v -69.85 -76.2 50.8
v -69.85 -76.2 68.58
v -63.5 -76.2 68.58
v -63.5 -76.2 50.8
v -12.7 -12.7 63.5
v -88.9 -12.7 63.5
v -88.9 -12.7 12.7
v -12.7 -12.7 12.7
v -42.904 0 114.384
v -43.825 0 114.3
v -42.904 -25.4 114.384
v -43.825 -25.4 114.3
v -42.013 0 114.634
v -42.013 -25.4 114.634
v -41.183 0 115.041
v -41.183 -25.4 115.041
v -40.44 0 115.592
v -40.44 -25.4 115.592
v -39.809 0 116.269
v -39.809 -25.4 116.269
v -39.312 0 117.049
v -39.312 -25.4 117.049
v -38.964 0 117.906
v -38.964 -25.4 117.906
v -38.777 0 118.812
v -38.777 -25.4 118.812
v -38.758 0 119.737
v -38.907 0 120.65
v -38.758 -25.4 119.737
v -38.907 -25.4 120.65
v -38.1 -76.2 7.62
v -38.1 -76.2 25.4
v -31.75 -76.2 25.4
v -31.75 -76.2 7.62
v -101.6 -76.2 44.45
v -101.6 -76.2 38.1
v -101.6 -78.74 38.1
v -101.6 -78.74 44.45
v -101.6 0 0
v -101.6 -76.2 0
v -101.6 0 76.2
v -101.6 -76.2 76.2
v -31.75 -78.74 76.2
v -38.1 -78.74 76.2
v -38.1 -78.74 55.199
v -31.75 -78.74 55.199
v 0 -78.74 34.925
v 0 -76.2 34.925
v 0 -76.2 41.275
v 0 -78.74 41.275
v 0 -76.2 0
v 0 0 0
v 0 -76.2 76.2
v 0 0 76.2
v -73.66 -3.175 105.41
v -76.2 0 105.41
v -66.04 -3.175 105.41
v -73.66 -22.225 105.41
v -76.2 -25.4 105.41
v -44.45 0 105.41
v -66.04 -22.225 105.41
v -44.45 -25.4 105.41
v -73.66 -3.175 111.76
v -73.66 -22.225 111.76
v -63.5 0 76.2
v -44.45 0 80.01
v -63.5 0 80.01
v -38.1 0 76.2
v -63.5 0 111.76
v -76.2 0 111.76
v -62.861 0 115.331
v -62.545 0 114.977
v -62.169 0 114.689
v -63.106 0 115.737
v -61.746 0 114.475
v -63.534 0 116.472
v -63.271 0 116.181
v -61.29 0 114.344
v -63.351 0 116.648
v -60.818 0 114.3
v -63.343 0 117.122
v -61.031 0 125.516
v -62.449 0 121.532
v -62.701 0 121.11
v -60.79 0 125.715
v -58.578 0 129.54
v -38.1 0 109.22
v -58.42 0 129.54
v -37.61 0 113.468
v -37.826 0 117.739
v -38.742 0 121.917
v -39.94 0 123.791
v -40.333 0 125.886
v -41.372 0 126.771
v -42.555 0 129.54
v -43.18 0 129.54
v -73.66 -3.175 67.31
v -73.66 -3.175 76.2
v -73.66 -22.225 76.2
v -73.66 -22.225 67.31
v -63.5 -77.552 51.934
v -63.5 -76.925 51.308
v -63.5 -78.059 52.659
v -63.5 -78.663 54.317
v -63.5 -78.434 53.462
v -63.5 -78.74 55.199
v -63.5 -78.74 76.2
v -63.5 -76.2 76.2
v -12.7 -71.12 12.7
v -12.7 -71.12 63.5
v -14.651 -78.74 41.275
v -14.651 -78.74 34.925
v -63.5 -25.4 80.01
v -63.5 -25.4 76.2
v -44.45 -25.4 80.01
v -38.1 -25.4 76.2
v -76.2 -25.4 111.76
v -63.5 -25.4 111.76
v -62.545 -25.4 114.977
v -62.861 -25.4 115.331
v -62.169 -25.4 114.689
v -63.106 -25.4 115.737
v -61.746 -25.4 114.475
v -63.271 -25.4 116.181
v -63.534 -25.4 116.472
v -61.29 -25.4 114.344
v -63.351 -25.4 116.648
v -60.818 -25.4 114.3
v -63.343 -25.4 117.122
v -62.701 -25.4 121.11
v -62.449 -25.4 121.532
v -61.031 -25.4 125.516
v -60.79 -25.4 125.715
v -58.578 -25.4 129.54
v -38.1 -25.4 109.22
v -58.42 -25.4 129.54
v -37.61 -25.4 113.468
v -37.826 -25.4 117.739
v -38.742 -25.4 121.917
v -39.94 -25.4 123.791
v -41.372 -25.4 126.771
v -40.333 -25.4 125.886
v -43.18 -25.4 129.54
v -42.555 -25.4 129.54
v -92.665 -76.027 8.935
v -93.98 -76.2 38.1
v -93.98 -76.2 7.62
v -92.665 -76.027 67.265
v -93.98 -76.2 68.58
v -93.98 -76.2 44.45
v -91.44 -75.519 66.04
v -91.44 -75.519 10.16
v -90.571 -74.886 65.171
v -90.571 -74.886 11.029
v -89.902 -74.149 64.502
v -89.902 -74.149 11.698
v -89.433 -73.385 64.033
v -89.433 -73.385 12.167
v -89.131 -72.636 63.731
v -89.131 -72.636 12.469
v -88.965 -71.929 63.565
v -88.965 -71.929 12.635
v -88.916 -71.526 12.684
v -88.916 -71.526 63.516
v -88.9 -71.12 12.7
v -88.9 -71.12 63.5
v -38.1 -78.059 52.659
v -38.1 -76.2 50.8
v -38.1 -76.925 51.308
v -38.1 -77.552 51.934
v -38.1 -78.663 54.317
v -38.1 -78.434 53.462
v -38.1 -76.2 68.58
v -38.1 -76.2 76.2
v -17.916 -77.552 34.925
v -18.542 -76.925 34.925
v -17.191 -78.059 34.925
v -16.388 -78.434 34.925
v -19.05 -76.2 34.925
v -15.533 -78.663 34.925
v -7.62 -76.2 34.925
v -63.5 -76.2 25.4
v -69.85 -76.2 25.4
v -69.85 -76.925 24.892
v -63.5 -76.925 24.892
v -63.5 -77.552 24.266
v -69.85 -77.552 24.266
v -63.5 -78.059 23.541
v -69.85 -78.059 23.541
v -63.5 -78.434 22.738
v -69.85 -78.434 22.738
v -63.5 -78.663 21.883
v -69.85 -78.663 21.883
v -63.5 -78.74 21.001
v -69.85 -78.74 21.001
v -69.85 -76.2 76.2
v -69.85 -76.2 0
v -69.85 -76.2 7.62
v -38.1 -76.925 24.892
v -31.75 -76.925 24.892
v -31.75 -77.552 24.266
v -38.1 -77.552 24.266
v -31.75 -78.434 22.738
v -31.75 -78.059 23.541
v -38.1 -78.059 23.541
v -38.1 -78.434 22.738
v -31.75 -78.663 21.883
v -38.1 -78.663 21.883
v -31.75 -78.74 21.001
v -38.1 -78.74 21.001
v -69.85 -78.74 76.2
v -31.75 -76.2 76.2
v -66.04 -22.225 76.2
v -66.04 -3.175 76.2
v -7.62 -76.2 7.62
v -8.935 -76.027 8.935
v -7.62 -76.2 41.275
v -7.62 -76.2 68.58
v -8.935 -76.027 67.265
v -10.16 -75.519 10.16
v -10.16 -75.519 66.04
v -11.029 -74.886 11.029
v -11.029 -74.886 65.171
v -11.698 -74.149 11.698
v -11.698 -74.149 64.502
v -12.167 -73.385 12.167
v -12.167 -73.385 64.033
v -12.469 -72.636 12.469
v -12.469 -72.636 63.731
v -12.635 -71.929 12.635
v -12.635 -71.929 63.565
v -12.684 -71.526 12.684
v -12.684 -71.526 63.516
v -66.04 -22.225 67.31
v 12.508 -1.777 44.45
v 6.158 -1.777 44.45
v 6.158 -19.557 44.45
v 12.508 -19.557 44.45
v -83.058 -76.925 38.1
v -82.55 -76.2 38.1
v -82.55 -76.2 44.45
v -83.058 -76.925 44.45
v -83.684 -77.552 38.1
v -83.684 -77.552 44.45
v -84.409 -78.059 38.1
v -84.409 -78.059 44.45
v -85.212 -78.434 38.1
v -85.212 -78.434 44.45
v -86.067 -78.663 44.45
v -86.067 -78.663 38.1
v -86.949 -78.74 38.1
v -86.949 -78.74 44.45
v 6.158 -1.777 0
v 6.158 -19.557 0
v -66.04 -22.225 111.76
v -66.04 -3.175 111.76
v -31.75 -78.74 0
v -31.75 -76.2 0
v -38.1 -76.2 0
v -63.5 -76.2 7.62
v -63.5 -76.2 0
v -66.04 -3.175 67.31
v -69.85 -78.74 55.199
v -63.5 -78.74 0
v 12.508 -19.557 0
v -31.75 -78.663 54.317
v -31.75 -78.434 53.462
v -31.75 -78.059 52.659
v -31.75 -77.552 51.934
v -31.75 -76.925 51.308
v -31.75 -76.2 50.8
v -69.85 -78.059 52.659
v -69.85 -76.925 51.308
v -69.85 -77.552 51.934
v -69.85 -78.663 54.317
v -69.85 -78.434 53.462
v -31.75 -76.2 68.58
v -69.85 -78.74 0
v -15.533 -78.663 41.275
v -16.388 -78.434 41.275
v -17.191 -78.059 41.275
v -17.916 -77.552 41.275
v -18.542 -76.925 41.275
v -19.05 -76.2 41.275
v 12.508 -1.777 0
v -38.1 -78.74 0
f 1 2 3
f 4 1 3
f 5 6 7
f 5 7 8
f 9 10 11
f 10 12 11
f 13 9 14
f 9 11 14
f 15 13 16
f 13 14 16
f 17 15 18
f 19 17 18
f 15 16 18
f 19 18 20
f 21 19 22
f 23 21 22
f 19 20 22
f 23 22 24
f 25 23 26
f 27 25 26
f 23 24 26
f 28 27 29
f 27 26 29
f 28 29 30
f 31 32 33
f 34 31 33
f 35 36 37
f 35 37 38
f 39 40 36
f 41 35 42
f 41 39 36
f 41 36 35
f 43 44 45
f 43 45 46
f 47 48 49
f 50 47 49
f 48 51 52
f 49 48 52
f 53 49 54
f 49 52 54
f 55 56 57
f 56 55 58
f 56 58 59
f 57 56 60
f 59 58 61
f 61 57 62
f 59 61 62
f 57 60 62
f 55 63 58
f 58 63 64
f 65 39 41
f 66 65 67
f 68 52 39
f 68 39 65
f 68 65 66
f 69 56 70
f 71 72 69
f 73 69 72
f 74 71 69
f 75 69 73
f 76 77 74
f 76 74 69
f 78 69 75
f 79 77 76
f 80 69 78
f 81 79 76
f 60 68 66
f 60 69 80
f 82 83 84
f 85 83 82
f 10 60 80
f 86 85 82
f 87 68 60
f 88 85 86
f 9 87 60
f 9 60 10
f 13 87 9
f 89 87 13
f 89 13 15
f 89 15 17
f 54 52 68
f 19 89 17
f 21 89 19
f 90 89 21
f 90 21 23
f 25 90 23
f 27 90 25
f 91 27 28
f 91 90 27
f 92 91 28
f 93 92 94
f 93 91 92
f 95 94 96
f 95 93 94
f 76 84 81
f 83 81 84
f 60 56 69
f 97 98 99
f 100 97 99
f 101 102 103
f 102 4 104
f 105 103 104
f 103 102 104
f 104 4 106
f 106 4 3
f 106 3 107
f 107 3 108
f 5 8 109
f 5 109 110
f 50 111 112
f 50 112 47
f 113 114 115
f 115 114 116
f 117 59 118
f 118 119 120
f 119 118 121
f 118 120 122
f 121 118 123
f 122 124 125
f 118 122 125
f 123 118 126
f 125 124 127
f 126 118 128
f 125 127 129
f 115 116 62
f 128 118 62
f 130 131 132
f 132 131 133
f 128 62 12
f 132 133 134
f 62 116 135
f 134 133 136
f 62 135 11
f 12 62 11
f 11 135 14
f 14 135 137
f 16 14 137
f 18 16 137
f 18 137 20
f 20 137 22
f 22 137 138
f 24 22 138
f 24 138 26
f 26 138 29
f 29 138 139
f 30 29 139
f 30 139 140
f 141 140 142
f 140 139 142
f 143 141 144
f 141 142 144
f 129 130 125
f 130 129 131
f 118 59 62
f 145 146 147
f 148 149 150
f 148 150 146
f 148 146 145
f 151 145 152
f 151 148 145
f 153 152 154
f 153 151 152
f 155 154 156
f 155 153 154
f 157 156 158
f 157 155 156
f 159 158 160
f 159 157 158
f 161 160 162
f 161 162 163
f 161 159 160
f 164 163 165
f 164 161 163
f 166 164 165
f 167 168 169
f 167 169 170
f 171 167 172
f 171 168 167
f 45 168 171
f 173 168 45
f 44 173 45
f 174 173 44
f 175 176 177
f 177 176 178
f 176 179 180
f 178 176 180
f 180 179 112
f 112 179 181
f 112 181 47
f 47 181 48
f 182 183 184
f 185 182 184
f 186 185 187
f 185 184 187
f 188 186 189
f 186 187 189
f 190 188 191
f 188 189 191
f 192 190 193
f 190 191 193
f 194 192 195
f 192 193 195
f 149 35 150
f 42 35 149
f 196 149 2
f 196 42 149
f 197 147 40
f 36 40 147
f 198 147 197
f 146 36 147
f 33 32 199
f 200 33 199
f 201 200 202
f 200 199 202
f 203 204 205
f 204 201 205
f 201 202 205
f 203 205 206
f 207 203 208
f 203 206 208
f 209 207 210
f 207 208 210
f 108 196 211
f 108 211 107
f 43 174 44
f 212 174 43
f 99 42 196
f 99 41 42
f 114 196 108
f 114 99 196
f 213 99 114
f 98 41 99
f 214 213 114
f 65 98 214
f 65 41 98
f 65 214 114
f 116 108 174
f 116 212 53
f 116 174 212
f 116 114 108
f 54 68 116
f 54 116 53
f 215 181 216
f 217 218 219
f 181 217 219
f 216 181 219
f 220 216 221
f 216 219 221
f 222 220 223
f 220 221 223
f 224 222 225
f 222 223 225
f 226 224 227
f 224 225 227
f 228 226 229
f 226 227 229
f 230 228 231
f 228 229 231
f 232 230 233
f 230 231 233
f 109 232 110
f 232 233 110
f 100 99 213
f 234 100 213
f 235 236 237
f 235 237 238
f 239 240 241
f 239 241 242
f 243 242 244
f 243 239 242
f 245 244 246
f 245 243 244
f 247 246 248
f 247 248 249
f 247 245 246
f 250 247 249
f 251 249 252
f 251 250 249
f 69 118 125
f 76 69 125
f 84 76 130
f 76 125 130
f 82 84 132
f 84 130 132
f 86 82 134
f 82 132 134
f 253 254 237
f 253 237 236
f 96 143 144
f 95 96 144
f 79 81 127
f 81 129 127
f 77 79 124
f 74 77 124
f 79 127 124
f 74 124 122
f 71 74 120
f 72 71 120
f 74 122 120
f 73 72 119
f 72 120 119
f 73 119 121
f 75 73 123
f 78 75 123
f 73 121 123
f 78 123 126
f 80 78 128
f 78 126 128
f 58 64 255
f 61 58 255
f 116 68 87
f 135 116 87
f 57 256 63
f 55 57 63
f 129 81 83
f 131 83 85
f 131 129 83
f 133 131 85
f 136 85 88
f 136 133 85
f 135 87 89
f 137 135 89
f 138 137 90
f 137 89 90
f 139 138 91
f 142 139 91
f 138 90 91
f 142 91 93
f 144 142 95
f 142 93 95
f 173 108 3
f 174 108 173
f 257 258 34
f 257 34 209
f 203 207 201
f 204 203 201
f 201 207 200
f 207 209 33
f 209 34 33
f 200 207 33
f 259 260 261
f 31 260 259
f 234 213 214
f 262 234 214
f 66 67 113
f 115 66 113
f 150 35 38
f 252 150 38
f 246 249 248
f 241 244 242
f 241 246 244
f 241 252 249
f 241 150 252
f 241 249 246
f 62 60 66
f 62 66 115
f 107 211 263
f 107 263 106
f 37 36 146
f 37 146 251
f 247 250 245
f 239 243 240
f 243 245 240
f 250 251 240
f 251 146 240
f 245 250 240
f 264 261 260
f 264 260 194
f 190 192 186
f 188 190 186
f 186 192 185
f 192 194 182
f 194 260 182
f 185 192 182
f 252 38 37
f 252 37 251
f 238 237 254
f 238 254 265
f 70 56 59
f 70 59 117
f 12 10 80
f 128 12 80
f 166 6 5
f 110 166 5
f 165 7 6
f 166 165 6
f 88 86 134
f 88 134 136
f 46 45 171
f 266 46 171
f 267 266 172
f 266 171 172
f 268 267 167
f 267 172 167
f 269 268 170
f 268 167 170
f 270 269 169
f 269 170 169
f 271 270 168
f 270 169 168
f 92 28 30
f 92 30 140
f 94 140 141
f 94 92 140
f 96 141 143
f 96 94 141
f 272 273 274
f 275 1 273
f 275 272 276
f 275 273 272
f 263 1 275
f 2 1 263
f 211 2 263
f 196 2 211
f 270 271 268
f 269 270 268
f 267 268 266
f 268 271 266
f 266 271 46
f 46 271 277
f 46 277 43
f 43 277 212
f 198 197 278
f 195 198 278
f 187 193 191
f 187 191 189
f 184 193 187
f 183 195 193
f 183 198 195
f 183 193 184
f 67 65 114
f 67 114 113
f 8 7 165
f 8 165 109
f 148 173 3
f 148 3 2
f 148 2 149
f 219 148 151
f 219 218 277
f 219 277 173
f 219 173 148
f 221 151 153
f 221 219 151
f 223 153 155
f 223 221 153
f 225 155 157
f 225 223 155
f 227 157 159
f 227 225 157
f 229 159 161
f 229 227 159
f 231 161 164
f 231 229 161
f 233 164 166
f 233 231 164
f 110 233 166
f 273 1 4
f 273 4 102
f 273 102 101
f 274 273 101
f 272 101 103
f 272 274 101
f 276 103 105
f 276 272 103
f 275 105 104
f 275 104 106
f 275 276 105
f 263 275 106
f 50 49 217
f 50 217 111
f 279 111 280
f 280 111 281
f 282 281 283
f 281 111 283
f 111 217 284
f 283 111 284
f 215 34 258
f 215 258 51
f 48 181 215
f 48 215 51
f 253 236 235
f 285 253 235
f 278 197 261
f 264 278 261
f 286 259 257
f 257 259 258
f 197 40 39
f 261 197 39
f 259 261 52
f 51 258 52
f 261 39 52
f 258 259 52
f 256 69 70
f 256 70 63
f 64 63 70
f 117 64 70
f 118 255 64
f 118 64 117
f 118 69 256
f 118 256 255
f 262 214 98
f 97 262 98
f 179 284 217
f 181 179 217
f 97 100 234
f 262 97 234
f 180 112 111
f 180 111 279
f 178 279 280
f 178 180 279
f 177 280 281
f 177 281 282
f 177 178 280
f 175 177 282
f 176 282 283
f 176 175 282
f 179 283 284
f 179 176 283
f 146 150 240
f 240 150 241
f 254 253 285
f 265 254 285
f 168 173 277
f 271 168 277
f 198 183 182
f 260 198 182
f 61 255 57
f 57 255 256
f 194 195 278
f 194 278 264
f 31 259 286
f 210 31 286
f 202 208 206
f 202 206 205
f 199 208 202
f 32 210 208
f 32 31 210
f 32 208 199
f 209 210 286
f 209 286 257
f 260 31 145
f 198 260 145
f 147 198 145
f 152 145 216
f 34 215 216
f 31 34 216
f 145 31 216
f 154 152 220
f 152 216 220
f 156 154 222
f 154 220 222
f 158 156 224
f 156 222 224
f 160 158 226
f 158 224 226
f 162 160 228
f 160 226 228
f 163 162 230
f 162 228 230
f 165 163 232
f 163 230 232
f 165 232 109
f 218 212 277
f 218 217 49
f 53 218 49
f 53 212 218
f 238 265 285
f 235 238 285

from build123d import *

# Parameters (mm, degrees)
F0_W        = 101.6
F0_H        = 76.2
F1_DEPTH    = 76.2
F2_T        = -12.7
F3_R        = 5.08
F4_W        = 6.35
F4_H        = 25.4
F4_W_2      = 19.05
F4_H_2      = 6.35
F5_DEPTH    = 2.54
F6_T1_DEPTH = 28.3470452561
F6_T3_DEPTH = 28.3470452561
F6_T5_DEPTH = 28.3470452561
F6_T7_DEPTH = 28.3470452561
F7_W        = 25.4
F7_H        = 38.1
F8_DEPTH    = 25.4
F9_W        = 25.4
F9_H        = 2.54
F10_ANGLE   = 45
F11_W       = 25.4
F11_H       = 5.08
F12_ANGLE   = 60
F13_START   = 15.24
F8_FACE2_W  = 25.4
F8_FACE2_H  = 25.4
F13_DEPTH   = 10.16
F14_R       = 2.54
F15_R       = 5.08
F16_W       = 25.4
F16_H       = 25.4
F17_DEPTH   = 19.05
F18_DEPTH   = 12.7
F20_DEPTH   = 44.45
F21_W       = 6.35
F21_H       = 17.78
F22_DEPTH   = 44.45


# Not quite as in the source:
# - a fillet or chamfer that OpenCascade refuses, or shapes differently, is made with other operations: its cross-section is extruded or revolved along the edge and cut away or added


with BuildPart() as f1:
    # F0 (on Front) → F1 (new body)
    with BuildSketch(Plane.XZ):
        with Locations((-50.8, 38.1)):
            Rectangle(F0_W, F0_H)
    extrude(amount=F1_DEPTH)

    # F2
    f2_openings = [f1.faces().sort_by_distance(p)[0] for p in [
        (-50.8, -76.2, 38.1),
    ]]
    offset(amount=F2_T, openings=f2_openings)

    # F3
    f3_edges = [f1.edges().sort_by_distance(p)[0] for p in [
        (-88.9, -76.2, 38.1),
        (-50.8, -76.2, 63.5),
        (-12.7, -76.2, 38.1),
        (-50.8, -76.2, 12.7),
    ]]
    fillet(f3_edges, radius=F3_R)

    # F4 (on face) → F5 (join)
    with BuildSketch(Plane.XZ.offset(76.2)):
        with Locations((-66.675, 63.5)):
            Rectangle(F4_W, F4_H)
        with Locations((-34.925, 63.5)):
            Rectangle(F4_W, F4_H)
        with Locations((-92.075, 41.275)):
            Rectangle(F4_W_2, F4_H_2)
        Polygon((0, 41.275), (-12.7, 41.275), (-19.05, 41.275), (-19.05, 34.925), (0, 34.925), align=None)
        with Locations((-66.675, 12.7)):
            Rectangle(F4_W, F4_H)
        with Locations((-34.925, 12.7)):
            Rectangle(F4_W, F4_H)
    extrude(amount=F5_DEPTH)

    # F6: fillet of radius 5.08 on 6 edges, made by hand

    # F6_s2 → F6_t1 (cut)
    with BuildSketch(Plane.XY.offset(27.1014773719)):
        with BuildLine():
            ThreePointArc((-82.55, -76.2), (-84.4094090512, -78.0594090512), (-86.9494090512, -78.74))
            Line((-86.9494090512, -78.74), (-82.55, -78.74))
            Line((-82.55, -78.74), (-82.55, -76.2))
        make_face()
    extrude(amount=F6_T1_DEPTH, mode=Mode.SUBTRACT)

    # F6_s4 → F6_t3 (cut)
    with BuildSketch(Plane.YZ.offset(-80.8485226281)):
        with BuildLine():
            ThreePointArc((-76.2, 50.8), (-78.0594090512, 52.6594090512), (-78.74, 55.1994090512))
            Line((-78.74, 55.1994090512), (-78.74, 50.8))
            Line((-78.74, 50.8), (-76.2, 50.8))
        make_face()
        with BuildLine():
            ThreePointArc((-76.2, 25.4), (-78.0594090512, 23.5405909488), (-78.74, 21.0005909488))
            Line((-78.74, 21.0005909488), (-78.74, 25.4))
            Line((-78.74, 25.4), (-76.2, 25.4))
        make_face()
    extrude(amount=F6_T3_DEPTH, mode=Mode.SUBTRACT)

    # F6_s6 → F6_t5 (cut)
    with BuildSketch(Plane.YZ.offset(-49.0985226281)):
        with BuildLine():
            ThreePointArc((-78.74, 55.1994090512), (-78.0594090512, 52.6594090512), (-76.2, 50.8))
            Line((-76.2, 50.8), (-78.74, 50.8))
            Line((-78.74, 50.8), (-78.74, 55.1994090512))
        make_face()
        with BuildLine():
            ThreePointArc((-76.2, 25.4), (-78.0594090512, 23.5405909488), (-78.74, 21.0005909488))
            Line((-78.74, 21.0005909488), (-78.74, 25.4))
            Line((-78.74, 25.4), (-76.2, 25.4))
        make_face()
    extrude(amount=F6_T5_DEPTH, mode=Mode.SUBTRACT)

    # F6_s8 → F6_t7 (cut)
    with BuildSketch(Plane.XY.offset(23.9264773719)):
        with BuildLine():
            ThreePointArc((-14.6505909488, -78.74), (-17.1905909488, -78.0594090512), (-19.05, -76.2))
            Line((-19.05, -76.2), (-19.05, -78.74))
            Line((-19.05, -78.74), (-14.6505909488, -78.74))
        make_face()
    extrude(amount=F6_T7_DEPTH, mode=Mode.SUBTRACT)

    # F7 (on face) → F8 (join)
    with BuildSketch(Plane(origin=(0, 0, 0), x_dir=(-1, 0, 0), z_dir=(0, 1, 0))):
        with Locations((50.8, 95.25)):
            Rectangle(F7_W, F7_H)
    extrude(amount=-F8_DEPTH)

    # F9 (on face) → F10 (revolve)
    with BuildSketch(Plane(origin=(-63.5, 0, 0), x_dir=(0, -1, 0), z_dir=(-1, 0, 0))):
        with Locations((12.7, 113.03)):
            Rectangle(F9_W, F9_H)
    revolve(axis=Axis((-38.1, -12.7, 114.3), (0, 1, 0)), revolution_arc=F10_ANGLE)

    # F11 (on face) → F12 (revolve)
    with BuildSketch(Plane.YZ.offset(-38.1)):
        with Locations((-12.7, 111.76)):
            Rectangle(F11_W, F11_H)
    revolve(axis=Axis((-63.5, -12.7, 114.3), (0, -1, 0)), revolution_arc=F12_ANGLE)

    # F8_face2 (on face) → F13 (cut)
    with BuildSketch(Plane(origin=(-50.8, -12.7, 114.3), x_dir=(1, 0, 0), z_dir=(0, 0, 1)).offset(F13_START)):
        Rectangle(F8_FACE2_W, F8_FACE2_H)
    extrude(amount=F13_DEPTH, mode=Mode.SUBTRACT)

    # F14
    f14_edges = [f1.edges().sort_by_distance(p)[0] for p in [
        (-63.5, -12.7, 114.3),
    ]]
    fillet(f14_edges, radius=F14_R)

    # F15
    f15_edges = [f1.edges().sort_by_distance(p)[0] for p in [
        (-38.1, -12.7, 114.3),
    ]]
    fillet(f15_edges, radius=F15_R)

    # F16 (on face) → F17 (cut)
    with BuildSketch(Plane(origin=(-63.5, 0, 0), x_dir=(0, -1, 0), z_dir=(-1, 0, 0))):
        with Locations((12.7, 92.71)):
            Rectangle(F16_W, F16_H)
    extrude(amount=-F17_DEPTH, mode=Mode.SUBTRACT)

    # F18 (add): a face of the model
    f18_faces = [f1.faces().sort_by_distance(p)[0] for p in [
        (-63.5, -12.7, 108.585),
    ]]
    extrude(f18_faces, amount=F18_DEPTH)

    # F19 (on face) → F20 (cut)
    with BuildSketch(Plane.XY.offset(111.76)):
        with BuildLine():
            ThreePointArc((-73.66, -12.7000000431), (-69.8499999784, -16.51), (-66.04, -12.7))
            ThreePointArc((-66.04, -12.7), (-69.8500000216, -8.89), (-73.66, -12.7000000431))
        make_face()
        with BuildLine():
            Line((-66.04, -22.225), (-66.04, -12.7))
            ThreePointArc((-66.04, -12.7), (-69.8499999784, -16.51), (-73.66, -12.7000000431))
            Line((-73.66, -12.7000000431), (-73.66, -22.225))
            Line((-73.66, -22.225), (-66.04, -22.225))
        make_face()
        with BuildLine():
            ThreePointArc((-73.66, -12.7000000431), (-69.8500000216, -8.89), (-66.04, -12.7))
            Line((-66.04, -12.7), (-66.04, -3.175))
            Line((-66.04, -3.175), (-73.66, -3.175))
            Line((-73.66, -3.175), (-73.66, -12.7000000431))
        make_face()
    extrude(amount=-F20_DEPTH, mode=Mode.SUBTRACT)


with BuildPart() as f22:
    # F21 (on Top) → F22 (new body)
    with BuildSketch(Plane.XY):
        with Locations((9.3328396462, -10.6671517172)):
            Rectangle(F21_W, F21_H)
    extrude(amount=F22_DEPTH)


solid = Compound([f1.part, f22.part])
